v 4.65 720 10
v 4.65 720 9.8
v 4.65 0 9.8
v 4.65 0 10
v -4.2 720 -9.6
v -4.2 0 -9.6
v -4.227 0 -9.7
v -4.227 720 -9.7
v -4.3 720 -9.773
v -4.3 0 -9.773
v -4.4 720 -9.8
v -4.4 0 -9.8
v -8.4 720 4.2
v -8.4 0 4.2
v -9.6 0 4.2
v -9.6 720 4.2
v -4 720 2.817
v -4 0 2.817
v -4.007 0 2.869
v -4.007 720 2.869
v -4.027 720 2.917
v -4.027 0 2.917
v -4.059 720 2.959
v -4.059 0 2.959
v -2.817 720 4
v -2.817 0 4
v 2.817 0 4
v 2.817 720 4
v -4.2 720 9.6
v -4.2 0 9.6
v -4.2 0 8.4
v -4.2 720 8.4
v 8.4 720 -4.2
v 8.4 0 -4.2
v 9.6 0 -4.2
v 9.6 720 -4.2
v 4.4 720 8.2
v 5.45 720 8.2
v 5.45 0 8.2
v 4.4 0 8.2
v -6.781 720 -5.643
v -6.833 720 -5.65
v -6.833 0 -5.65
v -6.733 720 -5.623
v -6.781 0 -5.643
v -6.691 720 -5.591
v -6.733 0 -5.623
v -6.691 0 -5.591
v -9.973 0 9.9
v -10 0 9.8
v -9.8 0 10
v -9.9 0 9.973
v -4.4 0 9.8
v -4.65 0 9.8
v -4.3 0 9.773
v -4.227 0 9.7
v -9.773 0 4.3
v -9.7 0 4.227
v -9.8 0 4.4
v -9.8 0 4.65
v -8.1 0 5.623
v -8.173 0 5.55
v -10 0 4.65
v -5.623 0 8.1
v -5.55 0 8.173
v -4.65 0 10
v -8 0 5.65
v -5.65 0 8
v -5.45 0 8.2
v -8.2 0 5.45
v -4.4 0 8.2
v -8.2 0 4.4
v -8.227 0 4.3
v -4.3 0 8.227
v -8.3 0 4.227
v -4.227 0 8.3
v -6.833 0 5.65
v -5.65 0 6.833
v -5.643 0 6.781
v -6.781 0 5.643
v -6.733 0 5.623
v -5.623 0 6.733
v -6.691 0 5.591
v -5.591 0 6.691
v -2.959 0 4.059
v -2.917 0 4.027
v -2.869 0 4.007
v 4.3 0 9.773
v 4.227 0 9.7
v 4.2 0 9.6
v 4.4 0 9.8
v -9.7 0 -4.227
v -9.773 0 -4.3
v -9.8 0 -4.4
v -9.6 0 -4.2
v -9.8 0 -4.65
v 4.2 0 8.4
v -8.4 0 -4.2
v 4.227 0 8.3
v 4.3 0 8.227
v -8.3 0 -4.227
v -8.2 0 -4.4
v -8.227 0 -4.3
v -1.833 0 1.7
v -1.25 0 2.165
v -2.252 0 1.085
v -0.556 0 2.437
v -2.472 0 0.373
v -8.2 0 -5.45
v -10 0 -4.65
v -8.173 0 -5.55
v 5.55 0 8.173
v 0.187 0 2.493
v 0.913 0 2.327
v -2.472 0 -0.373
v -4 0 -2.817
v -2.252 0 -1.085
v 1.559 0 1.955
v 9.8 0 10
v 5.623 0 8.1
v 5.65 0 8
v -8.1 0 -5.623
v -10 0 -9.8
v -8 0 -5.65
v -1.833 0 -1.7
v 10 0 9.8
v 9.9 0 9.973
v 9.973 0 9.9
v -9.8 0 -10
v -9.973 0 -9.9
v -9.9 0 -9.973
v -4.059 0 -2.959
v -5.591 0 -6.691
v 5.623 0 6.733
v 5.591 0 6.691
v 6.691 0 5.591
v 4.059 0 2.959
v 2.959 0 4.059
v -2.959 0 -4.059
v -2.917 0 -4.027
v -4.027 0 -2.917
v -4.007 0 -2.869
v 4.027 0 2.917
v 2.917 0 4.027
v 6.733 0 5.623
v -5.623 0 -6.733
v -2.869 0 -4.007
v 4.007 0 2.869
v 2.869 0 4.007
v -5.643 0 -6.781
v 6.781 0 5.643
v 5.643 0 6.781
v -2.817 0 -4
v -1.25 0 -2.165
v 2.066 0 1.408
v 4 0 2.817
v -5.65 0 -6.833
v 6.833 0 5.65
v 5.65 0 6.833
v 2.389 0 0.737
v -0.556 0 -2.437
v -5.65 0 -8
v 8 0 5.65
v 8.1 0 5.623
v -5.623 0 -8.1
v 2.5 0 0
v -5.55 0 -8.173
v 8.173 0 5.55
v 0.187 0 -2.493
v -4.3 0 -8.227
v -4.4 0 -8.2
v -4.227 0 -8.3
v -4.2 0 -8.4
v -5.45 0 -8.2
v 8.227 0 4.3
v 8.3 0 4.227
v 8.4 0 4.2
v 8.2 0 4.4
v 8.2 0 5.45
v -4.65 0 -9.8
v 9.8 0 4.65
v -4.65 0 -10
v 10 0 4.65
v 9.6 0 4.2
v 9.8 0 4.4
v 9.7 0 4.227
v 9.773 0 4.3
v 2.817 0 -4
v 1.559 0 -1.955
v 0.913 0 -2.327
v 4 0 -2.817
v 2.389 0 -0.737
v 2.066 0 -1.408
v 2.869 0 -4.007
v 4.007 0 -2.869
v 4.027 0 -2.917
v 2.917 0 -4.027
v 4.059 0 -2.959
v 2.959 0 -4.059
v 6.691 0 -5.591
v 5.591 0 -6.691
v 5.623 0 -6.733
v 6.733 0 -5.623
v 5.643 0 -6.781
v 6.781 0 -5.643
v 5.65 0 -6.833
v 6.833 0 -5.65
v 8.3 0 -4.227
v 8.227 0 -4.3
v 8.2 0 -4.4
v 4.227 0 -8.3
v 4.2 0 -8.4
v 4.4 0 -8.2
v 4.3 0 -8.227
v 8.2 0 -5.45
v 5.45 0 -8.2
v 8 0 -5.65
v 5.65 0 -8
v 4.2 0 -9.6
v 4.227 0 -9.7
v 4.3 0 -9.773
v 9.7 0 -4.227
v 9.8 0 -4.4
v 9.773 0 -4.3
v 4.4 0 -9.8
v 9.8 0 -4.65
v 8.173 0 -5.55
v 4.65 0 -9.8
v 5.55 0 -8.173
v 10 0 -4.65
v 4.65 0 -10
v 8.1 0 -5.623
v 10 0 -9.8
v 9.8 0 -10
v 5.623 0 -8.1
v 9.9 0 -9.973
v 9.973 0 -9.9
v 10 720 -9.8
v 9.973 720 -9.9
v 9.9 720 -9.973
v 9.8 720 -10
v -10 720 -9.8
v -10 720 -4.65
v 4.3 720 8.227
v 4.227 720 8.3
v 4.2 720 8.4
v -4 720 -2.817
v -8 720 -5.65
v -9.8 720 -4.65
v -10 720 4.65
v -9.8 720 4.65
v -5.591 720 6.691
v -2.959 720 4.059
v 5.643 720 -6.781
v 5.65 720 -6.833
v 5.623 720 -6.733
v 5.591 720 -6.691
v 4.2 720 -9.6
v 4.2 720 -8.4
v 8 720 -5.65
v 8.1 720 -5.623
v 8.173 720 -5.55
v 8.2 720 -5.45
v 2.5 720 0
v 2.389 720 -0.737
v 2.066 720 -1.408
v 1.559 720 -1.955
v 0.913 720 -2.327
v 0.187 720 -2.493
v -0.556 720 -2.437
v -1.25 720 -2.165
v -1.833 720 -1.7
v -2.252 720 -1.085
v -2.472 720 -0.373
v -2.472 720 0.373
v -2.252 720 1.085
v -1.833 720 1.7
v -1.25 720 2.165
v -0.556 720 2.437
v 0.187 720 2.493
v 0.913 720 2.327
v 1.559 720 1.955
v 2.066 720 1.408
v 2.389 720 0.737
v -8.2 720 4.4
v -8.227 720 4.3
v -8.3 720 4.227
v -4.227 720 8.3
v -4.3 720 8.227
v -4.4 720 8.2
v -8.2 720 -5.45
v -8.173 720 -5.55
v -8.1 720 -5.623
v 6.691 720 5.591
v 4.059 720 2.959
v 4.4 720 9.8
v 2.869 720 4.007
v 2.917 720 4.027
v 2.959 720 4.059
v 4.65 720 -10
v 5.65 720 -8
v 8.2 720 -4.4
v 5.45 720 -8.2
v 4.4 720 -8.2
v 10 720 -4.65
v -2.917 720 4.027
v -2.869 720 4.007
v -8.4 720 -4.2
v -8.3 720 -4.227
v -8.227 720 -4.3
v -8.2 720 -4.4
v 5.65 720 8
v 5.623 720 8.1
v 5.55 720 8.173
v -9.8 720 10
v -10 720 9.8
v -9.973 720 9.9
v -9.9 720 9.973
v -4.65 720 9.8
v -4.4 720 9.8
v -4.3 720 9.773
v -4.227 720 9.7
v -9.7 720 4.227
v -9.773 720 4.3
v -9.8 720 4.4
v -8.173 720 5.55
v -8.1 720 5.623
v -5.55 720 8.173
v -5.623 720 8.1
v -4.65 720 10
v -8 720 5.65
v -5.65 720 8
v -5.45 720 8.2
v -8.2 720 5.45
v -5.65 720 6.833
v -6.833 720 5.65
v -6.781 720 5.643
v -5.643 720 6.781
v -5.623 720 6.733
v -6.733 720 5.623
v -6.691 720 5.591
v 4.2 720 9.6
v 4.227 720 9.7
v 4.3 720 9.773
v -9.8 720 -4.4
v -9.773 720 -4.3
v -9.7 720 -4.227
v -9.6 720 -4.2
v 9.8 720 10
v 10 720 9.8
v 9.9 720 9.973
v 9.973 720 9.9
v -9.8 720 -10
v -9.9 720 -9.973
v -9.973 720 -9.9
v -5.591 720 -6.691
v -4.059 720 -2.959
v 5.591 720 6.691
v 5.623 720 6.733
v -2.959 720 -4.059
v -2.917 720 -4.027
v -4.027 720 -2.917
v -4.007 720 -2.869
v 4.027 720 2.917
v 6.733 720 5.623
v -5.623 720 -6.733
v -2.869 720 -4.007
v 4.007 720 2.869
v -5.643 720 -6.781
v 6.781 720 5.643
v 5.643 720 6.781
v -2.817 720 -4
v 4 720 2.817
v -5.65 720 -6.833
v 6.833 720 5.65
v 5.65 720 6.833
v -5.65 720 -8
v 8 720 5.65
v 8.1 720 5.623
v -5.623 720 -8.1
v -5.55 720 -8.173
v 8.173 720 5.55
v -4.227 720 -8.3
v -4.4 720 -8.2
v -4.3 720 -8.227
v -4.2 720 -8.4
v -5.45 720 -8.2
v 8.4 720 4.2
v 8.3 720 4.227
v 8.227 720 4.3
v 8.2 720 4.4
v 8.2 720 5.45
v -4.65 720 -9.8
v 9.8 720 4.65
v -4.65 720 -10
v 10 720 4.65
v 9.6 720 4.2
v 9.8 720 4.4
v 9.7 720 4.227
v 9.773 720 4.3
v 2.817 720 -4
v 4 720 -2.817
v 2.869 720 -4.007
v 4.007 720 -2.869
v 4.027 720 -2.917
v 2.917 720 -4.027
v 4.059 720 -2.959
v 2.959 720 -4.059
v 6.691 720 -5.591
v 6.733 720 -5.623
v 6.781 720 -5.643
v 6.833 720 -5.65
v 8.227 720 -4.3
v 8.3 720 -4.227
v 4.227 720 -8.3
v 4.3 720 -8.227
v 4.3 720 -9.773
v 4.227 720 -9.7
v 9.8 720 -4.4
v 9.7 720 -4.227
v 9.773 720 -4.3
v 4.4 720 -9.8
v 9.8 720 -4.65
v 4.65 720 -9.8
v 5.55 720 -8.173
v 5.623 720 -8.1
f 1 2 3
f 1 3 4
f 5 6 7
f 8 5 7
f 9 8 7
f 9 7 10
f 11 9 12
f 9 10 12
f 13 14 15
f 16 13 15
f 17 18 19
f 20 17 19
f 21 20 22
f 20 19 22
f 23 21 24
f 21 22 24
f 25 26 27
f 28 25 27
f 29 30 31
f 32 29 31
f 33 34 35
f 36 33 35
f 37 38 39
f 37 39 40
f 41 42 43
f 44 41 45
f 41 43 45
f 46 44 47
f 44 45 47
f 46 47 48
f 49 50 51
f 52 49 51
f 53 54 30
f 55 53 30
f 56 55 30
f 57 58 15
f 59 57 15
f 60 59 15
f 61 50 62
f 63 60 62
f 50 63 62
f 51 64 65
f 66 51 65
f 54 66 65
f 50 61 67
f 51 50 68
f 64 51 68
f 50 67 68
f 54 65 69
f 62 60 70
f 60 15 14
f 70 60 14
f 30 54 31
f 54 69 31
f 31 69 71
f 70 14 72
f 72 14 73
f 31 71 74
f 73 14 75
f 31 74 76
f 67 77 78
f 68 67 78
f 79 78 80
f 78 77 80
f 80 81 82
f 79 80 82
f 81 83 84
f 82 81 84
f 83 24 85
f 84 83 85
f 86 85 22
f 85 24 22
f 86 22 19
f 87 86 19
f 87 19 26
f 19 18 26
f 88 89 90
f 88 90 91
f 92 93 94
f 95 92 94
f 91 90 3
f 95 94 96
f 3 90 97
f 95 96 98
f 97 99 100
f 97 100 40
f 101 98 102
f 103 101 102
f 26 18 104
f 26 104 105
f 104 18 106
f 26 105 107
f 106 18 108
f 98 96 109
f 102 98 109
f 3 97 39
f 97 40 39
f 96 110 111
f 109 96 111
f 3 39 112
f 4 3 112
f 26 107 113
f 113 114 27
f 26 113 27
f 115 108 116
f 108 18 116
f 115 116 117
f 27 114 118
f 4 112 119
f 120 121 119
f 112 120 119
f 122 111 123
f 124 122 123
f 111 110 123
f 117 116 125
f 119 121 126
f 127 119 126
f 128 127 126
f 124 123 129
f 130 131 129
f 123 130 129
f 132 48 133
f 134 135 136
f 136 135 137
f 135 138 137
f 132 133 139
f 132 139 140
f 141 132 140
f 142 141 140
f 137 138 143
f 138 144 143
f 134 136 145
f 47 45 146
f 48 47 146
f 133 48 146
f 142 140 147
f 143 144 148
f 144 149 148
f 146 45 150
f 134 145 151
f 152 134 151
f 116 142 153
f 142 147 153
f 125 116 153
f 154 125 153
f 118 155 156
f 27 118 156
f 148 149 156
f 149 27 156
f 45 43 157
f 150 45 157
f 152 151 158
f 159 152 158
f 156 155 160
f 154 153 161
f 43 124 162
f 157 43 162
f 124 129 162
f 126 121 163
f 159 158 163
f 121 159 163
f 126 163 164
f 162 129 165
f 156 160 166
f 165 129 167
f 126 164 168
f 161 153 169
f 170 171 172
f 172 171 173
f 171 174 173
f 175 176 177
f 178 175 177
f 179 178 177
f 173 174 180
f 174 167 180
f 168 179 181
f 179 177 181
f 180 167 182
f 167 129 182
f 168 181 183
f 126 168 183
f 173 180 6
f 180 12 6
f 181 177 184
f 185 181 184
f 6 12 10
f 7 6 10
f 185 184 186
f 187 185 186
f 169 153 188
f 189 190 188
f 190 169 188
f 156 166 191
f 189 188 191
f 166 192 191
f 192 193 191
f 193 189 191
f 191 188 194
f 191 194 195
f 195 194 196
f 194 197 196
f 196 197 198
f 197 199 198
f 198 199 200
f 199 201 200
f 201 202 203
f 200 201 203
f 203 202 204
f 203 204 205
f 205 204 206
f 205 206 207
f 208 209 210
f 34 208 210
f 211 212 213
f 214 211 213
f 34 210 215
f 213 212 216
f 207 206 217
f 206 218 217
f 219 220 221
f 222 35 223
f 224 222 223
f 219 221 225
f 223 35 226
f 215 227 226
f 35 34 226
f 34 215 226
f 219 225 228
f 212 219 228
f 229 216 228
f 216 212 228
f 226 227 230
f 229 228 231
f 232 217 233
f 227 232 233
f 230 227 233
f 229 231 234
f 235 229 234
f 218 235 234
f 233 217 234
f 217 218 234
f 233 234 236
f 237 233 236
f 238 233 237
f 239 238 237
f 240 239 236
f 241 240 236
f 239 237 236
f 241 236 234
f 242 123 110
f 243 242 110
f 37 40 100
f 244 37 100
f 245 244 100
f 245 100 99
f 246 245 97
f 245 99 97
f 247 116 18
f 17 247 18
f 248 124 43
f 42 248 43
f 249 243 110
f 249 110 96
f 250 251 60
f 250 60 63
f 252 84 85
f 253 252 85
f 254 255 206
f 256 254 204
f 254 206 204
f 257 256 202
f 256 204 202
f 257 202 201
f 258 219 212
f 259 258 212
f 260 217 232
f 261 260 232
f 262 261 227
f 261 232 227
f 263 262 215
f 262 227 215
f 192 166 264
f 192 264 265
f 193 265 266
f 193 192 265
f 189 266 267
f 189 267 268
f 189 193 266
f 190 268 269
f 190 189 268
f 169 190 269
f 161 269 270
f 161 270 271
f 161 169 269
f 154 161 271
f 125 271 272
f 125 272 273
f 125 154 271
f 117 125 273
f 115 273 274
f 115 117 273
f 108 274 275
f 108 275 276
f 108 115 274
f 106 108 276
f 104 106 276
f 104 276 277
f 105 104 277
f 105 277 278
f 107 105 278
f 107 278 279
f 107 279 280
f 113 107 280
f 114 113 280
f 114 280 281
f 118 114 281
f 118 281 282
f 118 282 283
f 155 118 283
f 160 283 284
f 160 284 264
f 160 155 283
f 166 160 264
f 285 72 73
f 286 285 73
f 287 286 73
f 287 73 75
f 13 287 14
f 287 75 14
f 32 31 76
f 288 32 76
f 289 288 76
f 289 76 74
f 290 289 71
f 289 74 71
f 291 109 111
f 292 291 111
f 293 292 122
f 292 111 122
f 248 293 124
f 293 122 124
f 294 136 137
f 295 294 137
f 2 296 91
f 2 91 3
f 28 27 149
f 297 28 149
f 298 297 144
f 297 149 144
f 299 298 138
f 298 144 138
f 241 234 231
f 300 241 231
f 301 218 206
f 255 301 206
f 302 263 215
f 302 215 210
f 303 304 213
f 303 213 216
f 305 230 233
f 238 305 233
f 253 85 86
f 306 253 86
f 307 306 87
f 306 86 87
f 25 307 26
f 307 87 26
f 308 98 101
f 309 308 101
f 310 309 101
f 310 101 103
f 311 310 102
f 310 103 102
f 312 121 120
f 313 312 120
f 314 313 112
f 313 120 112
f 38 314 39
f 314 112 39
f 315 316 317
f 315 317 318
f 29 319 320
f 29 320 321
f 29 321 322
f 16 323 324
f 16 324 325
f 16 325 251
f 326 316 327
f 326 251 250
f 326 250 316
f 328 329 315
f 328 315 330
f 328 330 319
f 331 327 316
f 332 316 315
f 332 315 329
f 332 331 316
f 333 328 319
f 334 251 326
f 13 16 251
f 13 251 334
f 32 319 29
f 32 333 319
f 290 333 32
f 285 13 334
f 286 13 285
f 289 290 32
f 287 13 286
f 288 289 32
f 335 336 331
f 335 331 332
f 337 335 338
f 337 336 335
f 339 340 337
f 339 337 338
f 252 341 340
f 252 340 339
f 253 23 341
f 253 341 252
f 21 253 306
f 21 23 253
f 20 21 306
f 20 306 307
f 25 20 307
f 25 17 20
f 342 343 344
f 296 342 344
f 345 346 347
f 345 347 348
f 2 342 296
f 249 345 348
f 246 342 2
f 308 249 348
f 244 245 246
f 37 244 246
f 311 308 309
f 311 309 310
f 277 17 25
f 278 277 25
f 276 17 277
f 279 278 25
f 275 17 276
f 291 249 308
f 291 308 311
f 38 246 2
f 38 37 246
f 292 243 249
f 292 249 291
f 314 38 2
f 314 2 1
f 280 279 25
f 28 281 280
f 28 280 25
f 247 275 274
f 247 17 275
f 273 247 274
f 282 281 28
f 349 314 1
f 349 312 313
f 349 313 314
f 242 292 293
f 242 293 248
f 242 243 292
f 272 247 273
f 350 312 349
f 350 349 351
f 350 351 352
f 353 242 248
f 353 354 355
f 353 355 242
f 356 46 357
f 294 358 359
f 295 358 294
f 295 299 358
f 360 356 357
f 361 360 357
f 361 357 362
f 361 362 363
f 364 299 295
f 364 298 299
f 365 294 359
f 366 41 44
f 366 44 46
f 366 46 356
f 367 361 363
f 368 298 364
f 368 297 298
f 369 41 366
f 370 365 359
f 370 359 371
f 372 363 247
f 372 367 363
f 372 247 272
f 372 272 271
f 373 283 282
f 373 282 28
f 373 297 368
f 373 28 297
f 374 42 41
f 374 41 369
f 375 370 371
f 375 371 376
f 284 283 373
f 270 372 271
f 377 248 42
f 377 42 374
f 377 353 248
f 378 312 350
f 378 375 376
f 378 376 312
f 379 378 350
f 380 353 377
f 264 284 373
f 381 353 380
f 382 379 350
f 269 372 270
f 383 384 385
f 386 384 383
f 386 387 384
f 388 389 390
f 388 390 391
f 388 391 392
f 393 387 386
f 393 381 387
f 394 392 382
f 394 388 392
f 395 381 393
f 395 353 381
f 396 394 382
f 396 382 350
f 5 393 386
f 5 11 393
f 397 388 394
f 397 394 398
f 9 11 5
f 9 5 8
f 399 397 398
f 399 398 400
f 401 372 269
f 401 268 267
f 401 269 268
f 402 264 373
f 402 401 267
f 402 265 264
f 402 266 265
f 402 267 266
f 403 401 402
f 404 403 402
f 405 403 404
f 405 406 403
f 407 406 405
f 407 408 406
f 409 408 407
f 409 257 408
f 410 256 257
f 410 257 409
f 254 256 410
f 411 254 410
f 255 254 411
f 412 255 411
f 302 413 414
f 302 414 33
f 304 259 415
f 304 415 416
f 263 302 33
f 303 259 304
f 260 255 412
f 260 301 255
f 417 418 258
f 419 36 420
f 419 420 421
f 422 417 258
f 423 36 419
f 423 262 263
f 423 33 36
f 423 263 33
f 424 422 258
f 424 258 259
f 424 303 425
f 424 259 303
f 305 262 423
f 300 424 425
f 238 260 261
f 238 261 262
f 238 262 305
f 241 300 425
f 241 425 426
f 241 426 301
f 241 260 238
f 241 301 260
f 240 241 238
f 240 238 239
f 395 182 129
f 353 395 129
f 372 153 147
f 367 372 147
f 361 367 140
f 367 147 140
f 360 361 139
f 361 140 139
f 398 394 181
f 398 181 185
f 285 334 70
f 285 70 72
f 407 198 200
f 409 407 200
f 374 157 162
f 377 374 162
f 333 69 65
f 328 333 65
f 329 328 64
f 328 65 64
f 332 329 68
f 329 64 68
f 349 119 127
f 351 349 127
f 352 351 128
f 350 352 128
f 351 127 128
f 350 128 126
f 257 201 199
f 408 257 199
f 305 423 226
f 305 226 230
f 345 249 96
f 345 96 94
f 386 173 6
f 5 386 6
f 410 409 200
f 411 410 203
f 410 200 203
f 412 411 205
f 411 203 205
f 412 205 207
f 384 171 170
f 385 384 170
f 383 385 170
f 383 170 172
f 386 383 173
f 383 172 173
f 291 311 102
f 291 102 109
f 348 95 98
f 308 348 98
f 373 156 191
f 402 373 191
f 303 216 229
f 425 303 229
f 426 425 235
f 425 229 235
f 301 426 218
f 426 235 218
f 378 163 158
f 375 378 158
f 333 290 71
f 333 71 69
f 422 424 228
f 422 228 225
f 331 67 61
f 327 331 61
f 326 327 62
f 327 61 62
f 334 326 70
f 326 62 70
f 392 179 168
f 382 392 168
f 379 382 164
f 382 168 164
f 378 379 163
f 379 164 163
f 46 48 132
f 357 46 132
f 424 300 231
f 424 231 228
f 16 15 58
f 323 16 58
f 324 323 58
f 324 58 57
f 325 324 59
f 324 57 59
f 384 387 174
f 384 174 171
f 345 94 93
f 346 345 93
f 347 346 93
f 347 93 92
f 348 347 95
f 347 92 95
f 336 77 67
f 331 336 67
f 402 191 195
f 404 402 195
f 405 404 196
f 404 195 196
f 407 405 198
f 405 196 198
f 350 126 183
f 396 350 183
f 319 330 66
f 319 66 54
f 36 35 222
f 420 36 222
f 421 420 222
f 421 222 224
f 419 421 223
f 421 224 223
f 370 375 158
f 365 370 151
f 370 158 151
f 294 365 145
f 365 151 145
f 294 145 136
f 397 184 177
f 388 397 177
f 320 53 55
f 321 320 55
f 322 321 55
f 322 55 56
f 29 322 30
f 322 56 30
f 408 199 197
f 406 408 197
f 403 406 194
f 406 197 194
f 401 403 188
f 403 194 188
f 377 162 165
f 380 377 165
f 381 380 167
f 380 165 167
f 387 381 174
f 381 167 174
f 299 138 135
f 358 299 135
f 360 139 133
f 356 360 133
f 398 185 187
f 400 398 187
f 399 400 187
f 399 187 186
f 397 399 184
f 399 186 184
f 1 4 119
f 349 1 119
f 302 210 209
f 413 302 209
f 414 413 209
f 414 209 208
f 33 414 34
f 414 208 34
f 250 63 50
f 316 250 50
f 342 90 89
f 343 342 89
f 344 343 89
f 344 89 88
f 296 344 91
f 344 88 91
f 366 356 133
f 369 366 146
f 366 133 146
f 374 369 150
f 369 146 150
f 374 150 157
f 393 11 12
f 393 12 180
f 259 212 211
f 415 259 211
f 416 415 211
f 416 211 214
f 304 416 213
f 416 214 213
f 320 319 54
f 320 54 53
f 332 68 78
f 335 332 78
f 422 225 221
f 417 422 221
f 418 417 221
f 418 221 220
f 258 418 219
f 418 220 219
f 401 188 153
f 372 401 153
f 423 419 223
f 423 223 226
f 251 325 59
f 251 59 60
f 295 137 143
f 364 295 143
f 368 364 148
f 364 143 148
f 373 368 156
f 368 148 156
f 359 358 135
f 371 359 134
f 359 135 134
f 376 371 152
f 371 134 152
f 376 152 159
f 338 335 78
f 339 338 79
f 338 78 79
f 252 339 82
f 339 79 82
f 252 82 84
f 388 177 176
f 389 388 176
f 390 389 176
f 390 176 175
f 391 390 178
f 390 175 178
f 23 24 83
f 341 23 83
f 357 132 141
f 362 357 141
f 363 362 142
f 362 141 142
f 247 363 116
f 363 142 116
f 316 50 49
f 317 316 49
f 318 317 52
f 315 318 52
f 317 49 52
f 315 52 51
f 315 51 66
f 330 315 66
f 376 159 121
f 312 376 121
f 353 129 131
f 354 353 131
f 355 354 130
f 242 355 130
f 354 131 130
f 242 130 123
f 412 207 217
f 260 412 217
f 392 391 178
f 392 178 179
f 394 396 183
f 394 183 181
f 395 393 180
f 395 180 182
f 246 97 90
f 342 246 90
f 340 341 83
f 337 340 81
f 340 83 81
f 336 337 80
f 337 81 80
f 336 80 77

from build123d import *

# Parameters (mm, degrees)
SKETCH1_R           = 2.5
BOSS_EXTRUDE1_DEPTH = 720


with BuildPart() as part:
    # Sketch1 → Boss-Extrude1 (new body)
    with BuildSketch(Plane(origin=(0, 0, 0), x_dir=(1, 0, 0), z_dir=(0, 1, 0))):
        with BuildLine():
            Line((-10, 4.65), (-9.8, 4.65))
            Line((-9.8, 4.65), (-9.8, 4.4))
            ThreePointArc((-9.8, 4.4), (-9.741421356, 4.258578644), (-9.6, 4.2))
            Line((-9.6, 4.2), (-8.4, 4.2))
            ThreePointArc((-8.4, 4.2), (-8.258578644, 4.258578644), (-8.2, 4.4))
            Line((-8.2, 4.4), (-8.2, 5.45))
            ThreePointArc((-8.2, 5.45), (-8.141421356, 5.591421356), (-8, 5.65))
            Line((-8, 5.65), (-6.832842712, 5.65))
            ThreePointArc((-6.832842712, 5.65), (-6.756306026, 5.634775907), (-6.691421356, 5.591421356))
            Line((-6.691421356, 5.591421356), (-4.058578644, 2.958578644))
            ThreePointArc((-4.058578644, 2.958578644), (-4.015224093, 2.893693974), (-4, 2.817157288))
            Line((-4, 2.817157288), (-4, -2.817157288))
            ThreePointArc((-4, -2.817157288), (-4.015224093, -2.893693974), (-4.058578644, -2.958578644))
            Line((-4.058578644, -2.958578644), (-6.691421356, -5.591421356))
            ThreePointArc((-6.691421356, -5.591421356), (-6.756306026, -5.634775907), (-6.832842712, -5.65))
            Line((-6.832842712, -5.65), (-8, -5.65))
            ThreePointArc((-8, -5.65), (-8.141421356, -5.591421356), (-8.2, -5.45))
            Line((-8.2, -5.45), (-8.2, -4.4))
            ThreePointArc((-8.2, -4.4), (-8.258578644, -4.258578644), (-8.4, -4.2))
            Line((-8.4, -4.2), (-9.6, -4.2))
            ThreePointArc((-9.6, -4.2), (-9.741421356, -4.258578644), (-9.8, -4.4))
            Line((-9.8, -4.4), (-9.8, -4.65))
            Line((-9.8, -4.65), (-10, -4.65))
            Line((-10, -4.65), (-10, -9.8))
            ThreePointArc((-10, -9.8), (-9.941421356, -9.941421356), (-9.8, -10))
            Line((-9.8, -10), (-4.65, -10))
            Line((-4.65, -10), (-4.65, -9.8))
            Line((-4.65, -9.8), (-4.4, -9.8))
            ThreePointArc((-4.4, -9.8), (-4.258578644, -9.741421356), (-4.2, -9.6))
            Line((-4.2, -9.6), (-4.2, -8.4))
            ThreePointArc((-4.2, -8.4), (-4.258578644, -8.258578644), (-4.4, -8.2))
            Line((-4.4, -8.2), (-5.45, -8.2))
            ThreePointArc((-5.45, -8.2), (-5.591421356, -8.141421356), (-5.65, -8))
            Line((-5.65, -8), (-5.65, -6.832842712))
            ThreePointArc((-5.65, -6.832842712), (-5.634775907, -6.756306026), (-5.591421356, -6.691421356))
            Line((-5.591421356, -6.691421356), (-2.958578644, -4.058578644))
            ThreePointArc((-2.958578644, -4.058578644), (-2.893693974, -4.015224093), (-2.817157288, -4))
            Line((-2.817157288, -4), (2.817157288, -4))
            ThreePointArc((2.817157288, -4), (2.893693974, -4.015224093), (2.958578644, -4.058578644))
            Line((2.958578644, -4.058578644), (5.591421356, -6.691421356))
            ThreePointArc((5.591421356, -6.691421356), (5.634775907, -6.756306026), (5.65, -6.832842712))
            Line((5.65, -6.832842712), (5.65, -8))
            ThreePointArc((5.65, -8), (5.591421356, -8.141421356), (5.45, -8.2))
            Line((5.45, -8.2), (4.4, -8.2))
            ThreePointArc((4.4, -8.2), (4.258578644, -8.258578644), (4.2, -8.4))
            Line((4.2, -8.4), (4.2, -9.6))
            ThreePointArc((4.2, -9.6), (4.258578644, -9.741421356), (4.4, -9.8))
            Line((4.4, -9.8), (4.65, -9.8))
            Line((4.65, -9.8), (4.65, -10))
            Line((4.65, -10), (9.8, -10))
            ThreePointArc((9.8, -10), (9.941421356, -9.941421356), (10, -9.8))
            Line((10, -9.8), (10, -4.65))
            Line((10, -4.65), (9.8, -4.65))
            Line((9.8, -4.65), (9.8, -4.4))
            ThreePointArc((9.8, -4.4), (9.741421356, -4.258578644), (9.6, -4.2))
            Line((9.6, -4.2), (8.4, -4.2))
            ThreePointArc((8.4, -4.2), (8.258578644, -4.258578644), (8.2, -4.4))
            Line((8.2, -4.4), (8.2, -5.45))
            ThreePointArc((8.2, -5.45), (8.141421356, -5.591421356), (8, -5.65))
            Line((8, -5.65), (6.832842712, -5.65))
            ThreePointArc((6.832842712, -5.65), (6.756306026, -5.634775907), (6.691421356, -5.591421356))
            Line((6.691421356, -5.591421356), (4.058578644, -2.958578644))
            ThreePointArc((4.058578644, -2.958578644), (4.015224093, -2.893693974), (4, -2.817157288))
            Line((4, -2.817157288), (4, 2.817157288))
            ThreePointArc((4, 2.817157288), (4.015224093, 2.893693974), (4.058578644, 2.958578644))
            Line((4.058578644, 2.958578644), (6.691421356, 5.591421356))
            ThreePointArc((6.691421356, 5.591421356), (6.756306026, 5.634775907), (6.832842712, 5.65))
            Line((6.832842712, 5.65), (8, 5.65))
            ThreePointArc((8, 5.65), (8.141421356, 5.591421356), (8.2, 5.45))
            Line((8.2, 5.45), (8.2, 4.4))
            ThreePointArc((8.2, 4.4), (8.258578644, 4.258578644), (8.4, 4.2))
            Line((8.4, 4.2), (9.6, 4.2))
            ThreePointArc((9.6, 4.2), (9.741421356, 4.258578644), (9.8, 4.4))
            Line((9.8, 4.4), (9.8, 4.65))
            Line((9.8, 4.65), (10, 4.65))
            Line((10, 4.65), (10, 9.8))
            ThreePointArc((10, 9.8), (9.941421356, 9.941421356), (9.8, 10))
            Line((9.8, 10), (4.65, 10))
            Line((4.65, 10), (4.65, 9.8))
            Line((4.65, 9.8), (4.4, 9.8))
            ThreePointArc((4.4, 9.8), (4.258578644, 9.741421356), (4.2, 9.6))
            Line((4.2, 9.6), (4.2, 8.4))
            ThreePointArc((4.2, 8.4), (4.258578644, 8.258578644), (4.4, 8.2))
            Line((4.4, 8.2), (5.45, 8.2))
            ThreePointArc((5.45, 8.2), (5.591421356, 8.141421356), (5.65, 8))
            Line((5.65, 8), (5.65, 6.832842712))
            ThreePointArc((5.65, 6.832842712), (5.634775907, 6.756306026), (5.591421356, 6.691421356))
            Line((5.591421356, 6.691421356), (2.958578644, 4.058578644))
            ThreePointArc((2.958578644, 4.058578644), (2.893693974, 4.015224093), (2.817157288, 4))
            Line((2.817157288, 4), (-2.817157288, 4))
            ThreePointArc((-2.817157288, 4), (-2.893693974, 4.015224093), (-2.958578644, 4.058578644))
            Line((-2.958578644, 4.058578644), (-5.591421356, 6.691421356))
            ThreePointArc((-5.591421356, 6.691421356), (-5.634775907, 6.756306026), (-5.65, 6.832842712))
            Line((-5.65, 6.832842712), (-5.65, 8))
            ThreePointArc((-5.65, 8), (-5.591421356, 8.141421356), (-5.45, 8.2))
            Line((-5.45, 8.2), (-4.4, 8.2))
            ThreePointArc((-4.4, 8.2), (-4.258578644, 8.258578644), (-4.2, 8.4))
            Line((-4.2, 8.4), (-4.2, 9.6))
            ThreePointArc((-4.2, 9.6), (-4.258578644, 9.741421356), (-4.4, 9.8))
            Line((-4.4, 9.8), (-4.65, 9.8))
            Line((-4.65, 9.8), (-4.65, 10))
            Line((-4.65, 10), (-9.8, 10))
            ThreePointArc((-9.8, 10), (-9.941421356, 9.941421356), (-10, 9.8))
            Line((-10, 9.8), (-10, 4.65))
        make_face()
        Circle(SKETCH1_R, mode=Mode.SUBTRACT)
    extrude(amount=BOSS_EXTRUDE1_DEPTH)


solid = part.part
